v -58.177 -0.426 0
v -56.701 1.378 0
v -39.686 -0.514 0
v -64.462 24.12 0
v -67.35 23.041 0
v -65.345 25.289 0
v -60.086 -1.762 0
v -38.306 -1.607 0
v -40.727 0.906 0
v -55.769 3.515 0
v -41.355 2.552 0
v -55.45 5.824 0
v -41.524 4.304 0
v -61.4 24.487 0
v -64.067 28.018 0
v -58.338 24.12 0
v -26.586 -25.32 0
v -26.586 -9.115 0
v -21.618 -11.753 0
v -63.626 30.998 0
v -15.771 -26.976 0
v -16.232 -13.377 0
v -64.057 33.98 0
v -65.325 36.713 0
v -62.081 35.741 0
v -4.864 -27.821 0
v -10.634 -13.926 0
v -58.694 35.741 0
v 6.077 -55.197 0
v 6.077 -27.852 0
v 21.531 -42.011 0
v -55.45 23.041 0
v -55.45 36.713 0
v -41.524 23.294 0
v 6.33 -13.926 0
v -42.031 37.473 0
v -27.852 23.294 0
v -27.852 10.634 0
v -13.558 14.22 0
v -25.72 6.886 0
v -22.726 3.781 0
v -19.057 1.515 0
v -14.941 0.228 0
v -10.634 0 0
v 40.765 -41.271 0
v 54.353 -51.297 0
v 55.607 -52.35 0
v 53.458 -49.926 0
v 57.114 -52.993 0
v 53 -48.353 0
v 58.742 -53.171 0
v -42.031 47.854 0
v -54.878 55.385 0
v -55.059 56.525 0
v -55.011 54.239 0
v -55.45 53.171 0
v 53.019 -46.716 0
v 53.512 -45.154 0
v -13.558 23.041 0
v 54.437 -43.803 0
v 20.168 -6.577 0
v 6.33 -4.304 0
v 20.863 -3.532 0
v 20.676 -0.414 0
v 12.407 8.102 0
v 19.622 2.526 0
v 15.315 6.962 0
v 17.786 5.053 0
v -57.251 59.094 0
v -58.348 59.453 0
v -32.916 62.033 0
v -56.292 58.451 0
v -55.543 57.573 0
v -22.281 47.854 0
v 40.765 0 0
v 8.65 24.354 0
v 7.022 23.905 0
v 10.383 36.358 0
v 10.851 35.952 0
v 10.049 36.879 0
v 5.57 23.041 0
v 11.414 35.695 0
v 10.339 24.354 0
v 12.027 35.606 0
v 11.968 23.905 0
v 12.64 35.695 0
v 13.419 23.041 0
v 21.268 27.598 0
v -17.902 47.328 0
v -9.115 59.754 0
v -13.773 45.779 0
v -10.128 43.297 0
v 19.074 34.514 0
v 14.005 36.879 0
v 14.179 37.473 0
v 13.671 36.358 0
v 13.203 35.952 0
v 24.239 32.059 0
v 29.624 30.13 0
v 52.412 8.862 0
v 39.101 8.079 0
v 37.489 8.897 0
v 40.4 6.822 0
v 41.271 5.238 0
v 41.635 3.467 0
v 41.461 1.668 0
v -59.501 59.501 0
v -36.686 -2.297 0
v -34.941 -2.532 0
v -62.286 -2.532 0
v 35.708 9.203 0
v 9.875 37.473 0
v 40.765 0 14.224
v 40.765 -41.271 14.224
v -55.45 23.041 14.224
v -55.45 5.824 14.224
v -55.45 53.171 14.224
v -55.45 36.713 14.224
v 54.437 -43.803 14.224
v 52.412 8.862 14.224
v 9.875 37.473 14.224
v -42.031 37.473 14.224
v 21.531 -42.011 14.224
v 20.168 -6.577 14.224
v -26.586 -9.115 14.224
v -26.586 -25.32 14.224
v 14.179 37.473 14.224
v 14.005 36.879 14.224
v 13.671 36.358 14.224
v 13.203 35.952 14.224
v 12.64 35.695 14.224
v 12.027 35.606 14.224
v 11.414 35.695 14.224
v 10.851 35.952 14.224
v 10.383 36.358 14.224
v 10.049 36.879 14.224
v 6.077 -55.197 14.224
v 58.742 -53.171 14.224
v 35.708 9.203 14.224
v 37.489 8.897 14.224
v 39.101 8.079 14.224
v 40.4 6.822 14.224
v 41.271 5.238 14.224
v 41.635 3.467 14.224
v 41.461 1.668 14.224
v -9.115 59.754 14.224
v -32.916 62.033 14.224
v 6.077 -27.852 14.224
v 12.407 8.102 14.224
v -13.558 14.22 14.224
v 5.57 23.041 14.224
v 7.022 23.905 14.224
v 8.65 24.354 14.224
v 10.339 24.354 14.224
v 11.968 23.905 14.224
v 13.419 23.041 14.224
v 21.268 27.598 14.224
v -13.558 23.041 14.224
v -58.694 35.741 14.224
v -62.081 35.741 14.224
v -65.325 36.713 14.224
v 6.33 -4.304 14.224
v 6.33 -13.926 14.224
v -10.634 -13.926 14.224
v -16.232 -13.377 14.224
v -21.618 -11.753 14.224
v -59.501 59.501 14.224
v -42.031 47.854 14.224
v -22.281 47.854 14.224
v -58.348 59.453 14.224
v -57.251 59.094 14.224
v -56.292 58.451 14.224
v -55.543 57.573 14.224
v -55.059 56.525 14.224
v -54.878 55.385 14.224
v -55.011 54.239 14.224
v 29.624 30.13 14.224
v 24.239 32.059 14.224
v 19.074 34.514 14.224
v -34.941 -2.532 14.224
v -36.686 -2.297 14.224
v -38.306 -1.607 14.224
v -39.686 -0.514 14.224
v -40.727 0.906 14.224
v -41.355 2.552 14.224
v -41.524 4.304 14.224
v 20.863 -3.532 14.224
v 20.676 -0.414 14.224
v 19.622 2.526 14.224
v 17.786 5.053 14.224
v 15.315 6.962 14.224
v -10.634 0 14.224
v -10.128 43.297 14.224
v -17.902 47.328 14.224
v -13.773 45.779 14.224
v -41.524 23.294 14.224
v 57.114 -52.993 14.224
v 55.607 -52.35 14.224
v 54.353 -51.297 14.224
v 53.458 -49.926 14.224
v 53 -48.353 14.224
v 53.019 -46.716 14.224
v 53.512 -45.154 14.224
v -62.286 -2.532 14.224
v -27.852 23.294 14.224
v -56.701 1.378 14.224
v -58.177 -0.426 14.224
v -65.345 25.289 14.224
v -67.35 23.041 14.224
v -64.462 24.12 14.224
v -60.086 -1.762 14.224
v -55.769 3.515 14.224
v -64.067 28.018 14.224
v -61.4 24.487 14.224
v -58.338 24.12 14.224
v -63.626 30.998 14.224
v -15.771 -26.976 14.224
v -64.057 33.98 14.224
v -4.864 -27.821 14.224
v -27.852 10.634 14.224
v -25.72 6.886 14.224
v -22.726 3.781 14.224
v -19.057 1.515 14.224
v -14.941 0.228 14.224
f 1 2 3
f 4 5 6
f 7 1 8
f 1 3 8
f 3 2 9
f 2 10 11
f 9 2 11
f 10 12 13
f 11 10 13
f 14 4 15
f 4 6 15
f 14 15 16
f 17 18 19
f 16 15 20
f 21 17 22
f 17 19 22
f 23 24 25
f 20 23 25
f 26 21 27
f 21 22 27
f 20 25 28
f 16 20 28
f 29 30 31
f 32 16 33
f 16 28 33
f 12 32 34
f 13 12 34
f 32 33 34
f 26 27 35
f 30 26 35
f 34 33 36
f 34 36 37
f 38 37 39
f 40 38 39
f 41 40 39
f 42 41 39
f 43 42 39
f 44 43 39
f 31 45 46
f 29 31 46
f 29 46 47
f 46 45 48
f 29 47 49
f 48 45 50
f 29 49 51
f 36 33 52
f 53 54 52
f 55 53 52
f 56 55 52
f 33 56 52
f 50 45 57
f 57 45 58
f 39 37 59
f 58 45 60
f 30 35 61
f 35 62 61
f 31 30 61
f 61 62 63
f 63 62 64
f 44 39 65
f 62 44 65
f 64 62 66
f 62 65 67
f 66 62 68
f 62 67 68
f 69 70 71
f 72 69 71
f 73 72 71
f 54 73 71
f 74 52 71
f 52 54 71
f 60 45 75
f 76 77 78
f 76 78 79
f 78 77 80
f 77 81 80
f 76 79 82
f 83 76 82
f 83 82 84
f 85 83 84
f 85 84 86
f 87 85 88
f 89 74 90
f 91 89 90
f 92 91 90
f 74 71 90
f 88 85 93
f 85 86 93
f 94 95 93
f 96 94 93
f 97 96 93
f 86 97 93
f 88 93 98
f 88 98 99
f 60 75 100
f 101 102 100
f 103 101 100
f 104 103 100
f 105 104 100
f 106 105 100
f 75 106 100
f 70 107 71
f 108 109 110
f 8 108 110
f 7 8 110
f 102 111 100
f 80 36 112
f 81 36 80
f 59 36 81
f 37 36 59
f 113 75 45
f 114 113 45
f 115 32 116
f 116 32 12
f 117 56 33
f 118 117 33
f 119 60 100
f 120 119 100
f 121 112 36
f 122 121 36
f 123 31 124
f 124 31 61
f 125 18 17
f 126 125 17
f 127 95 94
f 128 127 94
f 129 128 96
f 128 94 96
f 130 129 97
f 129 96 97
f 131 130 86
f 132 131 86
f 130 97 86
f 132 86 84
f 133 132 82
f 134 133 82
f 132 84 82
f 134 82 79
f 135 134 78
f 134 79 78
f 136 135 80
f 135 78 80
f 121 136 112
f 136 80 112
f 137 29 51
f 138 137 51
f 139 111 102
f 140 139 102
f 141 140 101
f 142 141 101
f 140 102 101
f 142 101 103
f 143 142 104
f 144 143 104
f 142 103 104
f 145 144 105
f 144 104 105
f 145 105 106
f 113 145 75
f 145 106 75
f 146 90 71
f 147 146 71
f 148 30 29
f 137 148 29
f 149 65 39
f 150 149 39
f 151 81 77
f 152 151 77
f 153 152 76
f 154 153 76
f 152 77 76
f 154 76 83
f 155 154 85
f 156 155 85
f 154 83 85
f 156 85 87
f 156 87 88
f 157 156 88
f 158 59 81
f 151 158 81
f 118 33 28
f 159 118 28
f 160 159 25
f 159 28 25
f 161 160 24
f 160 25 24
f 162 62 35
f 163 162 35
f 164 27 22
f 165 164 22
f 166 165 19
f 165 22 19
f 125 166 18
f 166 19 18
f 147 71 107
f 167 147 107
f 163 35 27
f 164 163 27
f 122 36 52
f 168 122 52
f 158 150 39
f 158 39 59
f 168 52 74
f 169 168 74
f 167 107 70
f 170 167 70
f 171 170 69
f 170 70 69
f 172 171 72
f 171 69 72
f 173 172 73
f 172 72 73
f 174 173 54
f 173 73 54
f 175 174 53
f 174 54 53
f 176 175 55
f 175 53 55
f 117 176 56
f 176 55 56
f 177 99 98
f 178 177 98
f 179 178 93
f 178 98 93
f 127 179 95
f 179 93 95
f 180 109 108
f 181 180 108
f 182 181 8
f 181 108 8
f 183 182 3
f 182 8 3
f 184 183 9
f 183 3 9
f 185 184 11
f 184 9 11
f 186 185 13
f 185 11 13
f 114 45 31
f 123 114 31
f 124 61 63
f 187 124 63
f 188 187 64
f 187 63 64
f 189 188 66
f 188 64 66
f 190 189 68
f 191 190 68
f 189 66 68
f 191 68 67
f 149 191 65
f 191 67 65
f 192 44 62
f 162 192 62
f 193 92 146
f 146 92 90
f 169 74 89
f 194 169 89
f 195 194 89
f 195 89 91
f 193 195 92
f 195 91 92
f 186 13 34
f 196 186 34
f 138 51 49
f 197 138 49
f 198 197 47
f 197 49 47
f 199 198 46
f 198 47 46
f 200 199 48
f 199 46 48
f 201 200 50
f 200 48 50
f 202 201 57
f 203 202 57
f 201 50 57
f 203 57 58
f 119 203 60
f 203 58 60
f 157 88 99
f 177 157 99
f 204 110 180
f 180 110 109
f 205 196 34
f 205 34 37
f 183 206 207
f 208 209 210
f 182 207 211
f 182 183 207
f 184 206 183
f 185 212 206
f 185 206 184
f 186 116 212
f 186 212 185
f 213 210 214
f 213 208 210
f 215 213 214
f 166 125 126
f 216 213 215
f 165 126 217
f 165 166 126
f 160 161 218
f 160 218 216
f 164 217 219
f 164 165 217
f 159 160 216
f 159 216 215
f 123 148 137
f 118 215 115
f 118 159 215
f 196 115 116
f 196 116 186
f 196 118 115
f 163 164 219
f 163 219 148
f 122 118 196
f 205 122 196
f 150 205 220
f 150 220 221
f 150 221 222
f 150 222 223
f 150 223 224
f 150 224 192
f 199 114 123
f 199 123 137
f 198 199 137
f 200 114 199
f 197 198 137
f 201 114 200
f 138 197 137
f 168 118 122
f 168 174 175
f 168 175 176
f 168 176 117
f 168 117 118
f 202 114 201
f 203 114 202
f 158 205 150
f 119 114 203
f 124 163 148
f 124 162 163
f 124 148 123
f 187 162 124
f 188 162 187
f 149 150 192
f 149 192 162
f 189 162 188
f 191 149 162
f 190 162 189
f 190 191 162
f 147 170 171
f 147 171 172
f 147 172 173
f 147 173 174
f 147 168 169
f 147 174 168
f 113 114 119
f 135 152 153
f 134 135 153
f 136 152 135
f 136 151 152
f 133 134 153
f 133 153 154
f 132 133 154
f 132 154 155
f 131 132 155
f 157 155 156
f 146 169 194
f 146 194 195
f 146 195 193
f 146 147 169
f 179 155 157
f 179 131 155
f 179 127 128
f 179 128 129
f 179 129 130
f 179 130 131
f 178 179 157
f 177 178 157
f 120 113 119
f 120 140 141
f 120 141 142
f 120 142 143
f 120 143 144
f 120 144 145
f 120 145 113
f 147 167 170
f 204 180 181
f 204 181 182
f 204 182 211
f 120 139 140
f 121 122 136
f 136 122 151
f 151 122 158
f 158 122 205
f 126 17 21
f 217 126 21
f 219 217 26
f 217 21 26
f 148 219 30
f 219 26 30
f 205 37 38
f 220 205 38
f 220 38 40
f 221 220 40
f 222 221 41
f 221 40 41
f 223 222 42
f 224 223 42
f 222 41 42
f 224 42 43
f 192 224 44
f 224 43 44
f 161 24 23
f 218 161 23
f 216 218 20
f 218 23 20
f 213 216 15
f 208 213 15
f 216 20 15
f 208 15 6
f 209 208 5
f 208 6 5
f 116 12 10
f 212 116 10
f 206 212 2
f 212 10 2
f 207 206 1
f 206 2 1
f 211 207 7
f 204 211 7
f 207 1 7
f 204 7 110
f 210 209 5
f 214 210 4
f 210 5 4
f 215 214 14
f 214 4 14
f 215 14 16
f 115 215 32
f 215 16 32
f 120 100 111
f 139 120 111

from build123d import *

# Parameters (mm, degrees)
F1_DEPTH = 14.224


with BuildPart() as f1:
    # F0 (on Top) → F1 (new body)
    with BuildSketch(Plane.XY):
        with BuildLine():
            Line((-10.127848, 43.296553), (-9.115064, 59.754308))
            Line((-9.115064, 59.754308), (-32.915507, 62.033072))
            Line((-32.915507, 62.033072), (-59.501108, 59.501108))
            ThreePointArc((-59.501108, 59.501108), (-55.542844, 57.573082), (-55.449966, 53.171206))
            Line((-55.449966, 53.171206), (-55.449966, 36.713451))
            ThreePointArc((-55.449966, 36.713451), (-60.387293, 35.617261), (-65.324619, 36.713451))
            ThreePointArc((-65.324619, 36.713451), (-63.738246, 29.492092), (-67.350194, 23.040855))
            ThreePointArc((-67.350194, 23.040855), (-61.40008, 24.486692), (-55.449966, 23.040855))
            Line((-55.449966, 23.040855), (-55.449966, 5.823513))
            ThreePointArc((-55.449966, 5.823513), (-57.376818, 0.42562), (-62.286269, -2.531962))
            Line((-62.286269, -2.531962), (-34.941077, -2.531962))
            ThreePointArc((-34.941077, -2.531962), (-39.686396, -0.513738), (-41.524179, 4.304335))
            Line((-41.524179, 4.304335), (-41.524179, 23.294052))
            Line((-41.524179, 23.294052), (-27.851583, 23.294052))
            Line((-27.851583, 23.294052), (-27.851583, 10.634242))
            ThreePointArc((-27.851583, 10.634242), (-20.962224, 2.533472), (-10.63424, 0))
            Line((-10.63424, 0), (6.329905, -4.304335))
            Line((6.329905, -4.304335), (6.329905, -13.925791))
            Line((6.329905, -13.925791), (-10.63424, -13.925791))
            ThreePointArc((-10.63424, -13.925791), (-18.964741, -12.696939), (-26.585601, -9.115064))
            Line((-26.585601, -9.115064), (-26.585601, -25.319621))
            ThreePointArc((-26.585601, -25.319621), (-10.325346, -27.500204), (6.076708, -27.851582))
            Line((6.076708, -27.851582), (6.076708, -55.19677))
            Line((6.076708, -55.19677), (58.741521, -53.171206))
            ThreePointArc((58.741521, -53.171206), (53.457994, -49.925807), (54.437183, -43.802943))
            Line((54.437183, -43.802943), (52.411616, 8.861868))
            Line((52.411616, 8.861868), (35.707628, 9.202845))
            ThreePointArc((35.707628, 9.202845), (40.89498, 6.062472), (40.764589, 0))
            Line((40.764589, 0), (40.764589, -41.270979))
            Line((40.764589, -41.270979), (21.530654, -42.010745))
            Line((21.530654, -42.010745), (20.16781, -6.576743))
            ThreePointArc((20.16781, -6.576743), (19.622446, 2.526197), (12.406613, 8.102279))
            Line((12.406613, 8.102279), (-13.558293, 14.219645))
            Line((-13.558293, 14.219645), (-13.558293, 23.040855))
            Line((-13.558293, 23.040855), (5.570316, 23.040855))
            ThreePointArc((5.570316, 23.040855), (9.494858, 24.410603), (13.419399, 23.040855))
            Line((13.419399, 23.040855), (21.26848, 27.598385))
            Line((21.26848, 27.598385), (29.623957, 30.130347))
            ThreePointArc((29.623957, 30.130347), (21.62589, 33.222018), (14.178989, 37.473038))
            ThreePointArc((14.178989, 37.473038), (12.02682, 35.606476), (9.874651, 37.473038))
            Line((9.874651, 37.473038), (-42.030569, 37.473038))
            Line((-42.030569, 37.473038), (-42.030569, 47.854081))
            Line((-42.030569, 47.854081), (-22.281267, 47.854081))
            ThreePointArc((-22.281267, 47.854081), (-15.791339, 46.677234), (-10.127848, 43.296553))
        make_face()
    extrude(amount=F1_DEPTH)


solid = f1.part
